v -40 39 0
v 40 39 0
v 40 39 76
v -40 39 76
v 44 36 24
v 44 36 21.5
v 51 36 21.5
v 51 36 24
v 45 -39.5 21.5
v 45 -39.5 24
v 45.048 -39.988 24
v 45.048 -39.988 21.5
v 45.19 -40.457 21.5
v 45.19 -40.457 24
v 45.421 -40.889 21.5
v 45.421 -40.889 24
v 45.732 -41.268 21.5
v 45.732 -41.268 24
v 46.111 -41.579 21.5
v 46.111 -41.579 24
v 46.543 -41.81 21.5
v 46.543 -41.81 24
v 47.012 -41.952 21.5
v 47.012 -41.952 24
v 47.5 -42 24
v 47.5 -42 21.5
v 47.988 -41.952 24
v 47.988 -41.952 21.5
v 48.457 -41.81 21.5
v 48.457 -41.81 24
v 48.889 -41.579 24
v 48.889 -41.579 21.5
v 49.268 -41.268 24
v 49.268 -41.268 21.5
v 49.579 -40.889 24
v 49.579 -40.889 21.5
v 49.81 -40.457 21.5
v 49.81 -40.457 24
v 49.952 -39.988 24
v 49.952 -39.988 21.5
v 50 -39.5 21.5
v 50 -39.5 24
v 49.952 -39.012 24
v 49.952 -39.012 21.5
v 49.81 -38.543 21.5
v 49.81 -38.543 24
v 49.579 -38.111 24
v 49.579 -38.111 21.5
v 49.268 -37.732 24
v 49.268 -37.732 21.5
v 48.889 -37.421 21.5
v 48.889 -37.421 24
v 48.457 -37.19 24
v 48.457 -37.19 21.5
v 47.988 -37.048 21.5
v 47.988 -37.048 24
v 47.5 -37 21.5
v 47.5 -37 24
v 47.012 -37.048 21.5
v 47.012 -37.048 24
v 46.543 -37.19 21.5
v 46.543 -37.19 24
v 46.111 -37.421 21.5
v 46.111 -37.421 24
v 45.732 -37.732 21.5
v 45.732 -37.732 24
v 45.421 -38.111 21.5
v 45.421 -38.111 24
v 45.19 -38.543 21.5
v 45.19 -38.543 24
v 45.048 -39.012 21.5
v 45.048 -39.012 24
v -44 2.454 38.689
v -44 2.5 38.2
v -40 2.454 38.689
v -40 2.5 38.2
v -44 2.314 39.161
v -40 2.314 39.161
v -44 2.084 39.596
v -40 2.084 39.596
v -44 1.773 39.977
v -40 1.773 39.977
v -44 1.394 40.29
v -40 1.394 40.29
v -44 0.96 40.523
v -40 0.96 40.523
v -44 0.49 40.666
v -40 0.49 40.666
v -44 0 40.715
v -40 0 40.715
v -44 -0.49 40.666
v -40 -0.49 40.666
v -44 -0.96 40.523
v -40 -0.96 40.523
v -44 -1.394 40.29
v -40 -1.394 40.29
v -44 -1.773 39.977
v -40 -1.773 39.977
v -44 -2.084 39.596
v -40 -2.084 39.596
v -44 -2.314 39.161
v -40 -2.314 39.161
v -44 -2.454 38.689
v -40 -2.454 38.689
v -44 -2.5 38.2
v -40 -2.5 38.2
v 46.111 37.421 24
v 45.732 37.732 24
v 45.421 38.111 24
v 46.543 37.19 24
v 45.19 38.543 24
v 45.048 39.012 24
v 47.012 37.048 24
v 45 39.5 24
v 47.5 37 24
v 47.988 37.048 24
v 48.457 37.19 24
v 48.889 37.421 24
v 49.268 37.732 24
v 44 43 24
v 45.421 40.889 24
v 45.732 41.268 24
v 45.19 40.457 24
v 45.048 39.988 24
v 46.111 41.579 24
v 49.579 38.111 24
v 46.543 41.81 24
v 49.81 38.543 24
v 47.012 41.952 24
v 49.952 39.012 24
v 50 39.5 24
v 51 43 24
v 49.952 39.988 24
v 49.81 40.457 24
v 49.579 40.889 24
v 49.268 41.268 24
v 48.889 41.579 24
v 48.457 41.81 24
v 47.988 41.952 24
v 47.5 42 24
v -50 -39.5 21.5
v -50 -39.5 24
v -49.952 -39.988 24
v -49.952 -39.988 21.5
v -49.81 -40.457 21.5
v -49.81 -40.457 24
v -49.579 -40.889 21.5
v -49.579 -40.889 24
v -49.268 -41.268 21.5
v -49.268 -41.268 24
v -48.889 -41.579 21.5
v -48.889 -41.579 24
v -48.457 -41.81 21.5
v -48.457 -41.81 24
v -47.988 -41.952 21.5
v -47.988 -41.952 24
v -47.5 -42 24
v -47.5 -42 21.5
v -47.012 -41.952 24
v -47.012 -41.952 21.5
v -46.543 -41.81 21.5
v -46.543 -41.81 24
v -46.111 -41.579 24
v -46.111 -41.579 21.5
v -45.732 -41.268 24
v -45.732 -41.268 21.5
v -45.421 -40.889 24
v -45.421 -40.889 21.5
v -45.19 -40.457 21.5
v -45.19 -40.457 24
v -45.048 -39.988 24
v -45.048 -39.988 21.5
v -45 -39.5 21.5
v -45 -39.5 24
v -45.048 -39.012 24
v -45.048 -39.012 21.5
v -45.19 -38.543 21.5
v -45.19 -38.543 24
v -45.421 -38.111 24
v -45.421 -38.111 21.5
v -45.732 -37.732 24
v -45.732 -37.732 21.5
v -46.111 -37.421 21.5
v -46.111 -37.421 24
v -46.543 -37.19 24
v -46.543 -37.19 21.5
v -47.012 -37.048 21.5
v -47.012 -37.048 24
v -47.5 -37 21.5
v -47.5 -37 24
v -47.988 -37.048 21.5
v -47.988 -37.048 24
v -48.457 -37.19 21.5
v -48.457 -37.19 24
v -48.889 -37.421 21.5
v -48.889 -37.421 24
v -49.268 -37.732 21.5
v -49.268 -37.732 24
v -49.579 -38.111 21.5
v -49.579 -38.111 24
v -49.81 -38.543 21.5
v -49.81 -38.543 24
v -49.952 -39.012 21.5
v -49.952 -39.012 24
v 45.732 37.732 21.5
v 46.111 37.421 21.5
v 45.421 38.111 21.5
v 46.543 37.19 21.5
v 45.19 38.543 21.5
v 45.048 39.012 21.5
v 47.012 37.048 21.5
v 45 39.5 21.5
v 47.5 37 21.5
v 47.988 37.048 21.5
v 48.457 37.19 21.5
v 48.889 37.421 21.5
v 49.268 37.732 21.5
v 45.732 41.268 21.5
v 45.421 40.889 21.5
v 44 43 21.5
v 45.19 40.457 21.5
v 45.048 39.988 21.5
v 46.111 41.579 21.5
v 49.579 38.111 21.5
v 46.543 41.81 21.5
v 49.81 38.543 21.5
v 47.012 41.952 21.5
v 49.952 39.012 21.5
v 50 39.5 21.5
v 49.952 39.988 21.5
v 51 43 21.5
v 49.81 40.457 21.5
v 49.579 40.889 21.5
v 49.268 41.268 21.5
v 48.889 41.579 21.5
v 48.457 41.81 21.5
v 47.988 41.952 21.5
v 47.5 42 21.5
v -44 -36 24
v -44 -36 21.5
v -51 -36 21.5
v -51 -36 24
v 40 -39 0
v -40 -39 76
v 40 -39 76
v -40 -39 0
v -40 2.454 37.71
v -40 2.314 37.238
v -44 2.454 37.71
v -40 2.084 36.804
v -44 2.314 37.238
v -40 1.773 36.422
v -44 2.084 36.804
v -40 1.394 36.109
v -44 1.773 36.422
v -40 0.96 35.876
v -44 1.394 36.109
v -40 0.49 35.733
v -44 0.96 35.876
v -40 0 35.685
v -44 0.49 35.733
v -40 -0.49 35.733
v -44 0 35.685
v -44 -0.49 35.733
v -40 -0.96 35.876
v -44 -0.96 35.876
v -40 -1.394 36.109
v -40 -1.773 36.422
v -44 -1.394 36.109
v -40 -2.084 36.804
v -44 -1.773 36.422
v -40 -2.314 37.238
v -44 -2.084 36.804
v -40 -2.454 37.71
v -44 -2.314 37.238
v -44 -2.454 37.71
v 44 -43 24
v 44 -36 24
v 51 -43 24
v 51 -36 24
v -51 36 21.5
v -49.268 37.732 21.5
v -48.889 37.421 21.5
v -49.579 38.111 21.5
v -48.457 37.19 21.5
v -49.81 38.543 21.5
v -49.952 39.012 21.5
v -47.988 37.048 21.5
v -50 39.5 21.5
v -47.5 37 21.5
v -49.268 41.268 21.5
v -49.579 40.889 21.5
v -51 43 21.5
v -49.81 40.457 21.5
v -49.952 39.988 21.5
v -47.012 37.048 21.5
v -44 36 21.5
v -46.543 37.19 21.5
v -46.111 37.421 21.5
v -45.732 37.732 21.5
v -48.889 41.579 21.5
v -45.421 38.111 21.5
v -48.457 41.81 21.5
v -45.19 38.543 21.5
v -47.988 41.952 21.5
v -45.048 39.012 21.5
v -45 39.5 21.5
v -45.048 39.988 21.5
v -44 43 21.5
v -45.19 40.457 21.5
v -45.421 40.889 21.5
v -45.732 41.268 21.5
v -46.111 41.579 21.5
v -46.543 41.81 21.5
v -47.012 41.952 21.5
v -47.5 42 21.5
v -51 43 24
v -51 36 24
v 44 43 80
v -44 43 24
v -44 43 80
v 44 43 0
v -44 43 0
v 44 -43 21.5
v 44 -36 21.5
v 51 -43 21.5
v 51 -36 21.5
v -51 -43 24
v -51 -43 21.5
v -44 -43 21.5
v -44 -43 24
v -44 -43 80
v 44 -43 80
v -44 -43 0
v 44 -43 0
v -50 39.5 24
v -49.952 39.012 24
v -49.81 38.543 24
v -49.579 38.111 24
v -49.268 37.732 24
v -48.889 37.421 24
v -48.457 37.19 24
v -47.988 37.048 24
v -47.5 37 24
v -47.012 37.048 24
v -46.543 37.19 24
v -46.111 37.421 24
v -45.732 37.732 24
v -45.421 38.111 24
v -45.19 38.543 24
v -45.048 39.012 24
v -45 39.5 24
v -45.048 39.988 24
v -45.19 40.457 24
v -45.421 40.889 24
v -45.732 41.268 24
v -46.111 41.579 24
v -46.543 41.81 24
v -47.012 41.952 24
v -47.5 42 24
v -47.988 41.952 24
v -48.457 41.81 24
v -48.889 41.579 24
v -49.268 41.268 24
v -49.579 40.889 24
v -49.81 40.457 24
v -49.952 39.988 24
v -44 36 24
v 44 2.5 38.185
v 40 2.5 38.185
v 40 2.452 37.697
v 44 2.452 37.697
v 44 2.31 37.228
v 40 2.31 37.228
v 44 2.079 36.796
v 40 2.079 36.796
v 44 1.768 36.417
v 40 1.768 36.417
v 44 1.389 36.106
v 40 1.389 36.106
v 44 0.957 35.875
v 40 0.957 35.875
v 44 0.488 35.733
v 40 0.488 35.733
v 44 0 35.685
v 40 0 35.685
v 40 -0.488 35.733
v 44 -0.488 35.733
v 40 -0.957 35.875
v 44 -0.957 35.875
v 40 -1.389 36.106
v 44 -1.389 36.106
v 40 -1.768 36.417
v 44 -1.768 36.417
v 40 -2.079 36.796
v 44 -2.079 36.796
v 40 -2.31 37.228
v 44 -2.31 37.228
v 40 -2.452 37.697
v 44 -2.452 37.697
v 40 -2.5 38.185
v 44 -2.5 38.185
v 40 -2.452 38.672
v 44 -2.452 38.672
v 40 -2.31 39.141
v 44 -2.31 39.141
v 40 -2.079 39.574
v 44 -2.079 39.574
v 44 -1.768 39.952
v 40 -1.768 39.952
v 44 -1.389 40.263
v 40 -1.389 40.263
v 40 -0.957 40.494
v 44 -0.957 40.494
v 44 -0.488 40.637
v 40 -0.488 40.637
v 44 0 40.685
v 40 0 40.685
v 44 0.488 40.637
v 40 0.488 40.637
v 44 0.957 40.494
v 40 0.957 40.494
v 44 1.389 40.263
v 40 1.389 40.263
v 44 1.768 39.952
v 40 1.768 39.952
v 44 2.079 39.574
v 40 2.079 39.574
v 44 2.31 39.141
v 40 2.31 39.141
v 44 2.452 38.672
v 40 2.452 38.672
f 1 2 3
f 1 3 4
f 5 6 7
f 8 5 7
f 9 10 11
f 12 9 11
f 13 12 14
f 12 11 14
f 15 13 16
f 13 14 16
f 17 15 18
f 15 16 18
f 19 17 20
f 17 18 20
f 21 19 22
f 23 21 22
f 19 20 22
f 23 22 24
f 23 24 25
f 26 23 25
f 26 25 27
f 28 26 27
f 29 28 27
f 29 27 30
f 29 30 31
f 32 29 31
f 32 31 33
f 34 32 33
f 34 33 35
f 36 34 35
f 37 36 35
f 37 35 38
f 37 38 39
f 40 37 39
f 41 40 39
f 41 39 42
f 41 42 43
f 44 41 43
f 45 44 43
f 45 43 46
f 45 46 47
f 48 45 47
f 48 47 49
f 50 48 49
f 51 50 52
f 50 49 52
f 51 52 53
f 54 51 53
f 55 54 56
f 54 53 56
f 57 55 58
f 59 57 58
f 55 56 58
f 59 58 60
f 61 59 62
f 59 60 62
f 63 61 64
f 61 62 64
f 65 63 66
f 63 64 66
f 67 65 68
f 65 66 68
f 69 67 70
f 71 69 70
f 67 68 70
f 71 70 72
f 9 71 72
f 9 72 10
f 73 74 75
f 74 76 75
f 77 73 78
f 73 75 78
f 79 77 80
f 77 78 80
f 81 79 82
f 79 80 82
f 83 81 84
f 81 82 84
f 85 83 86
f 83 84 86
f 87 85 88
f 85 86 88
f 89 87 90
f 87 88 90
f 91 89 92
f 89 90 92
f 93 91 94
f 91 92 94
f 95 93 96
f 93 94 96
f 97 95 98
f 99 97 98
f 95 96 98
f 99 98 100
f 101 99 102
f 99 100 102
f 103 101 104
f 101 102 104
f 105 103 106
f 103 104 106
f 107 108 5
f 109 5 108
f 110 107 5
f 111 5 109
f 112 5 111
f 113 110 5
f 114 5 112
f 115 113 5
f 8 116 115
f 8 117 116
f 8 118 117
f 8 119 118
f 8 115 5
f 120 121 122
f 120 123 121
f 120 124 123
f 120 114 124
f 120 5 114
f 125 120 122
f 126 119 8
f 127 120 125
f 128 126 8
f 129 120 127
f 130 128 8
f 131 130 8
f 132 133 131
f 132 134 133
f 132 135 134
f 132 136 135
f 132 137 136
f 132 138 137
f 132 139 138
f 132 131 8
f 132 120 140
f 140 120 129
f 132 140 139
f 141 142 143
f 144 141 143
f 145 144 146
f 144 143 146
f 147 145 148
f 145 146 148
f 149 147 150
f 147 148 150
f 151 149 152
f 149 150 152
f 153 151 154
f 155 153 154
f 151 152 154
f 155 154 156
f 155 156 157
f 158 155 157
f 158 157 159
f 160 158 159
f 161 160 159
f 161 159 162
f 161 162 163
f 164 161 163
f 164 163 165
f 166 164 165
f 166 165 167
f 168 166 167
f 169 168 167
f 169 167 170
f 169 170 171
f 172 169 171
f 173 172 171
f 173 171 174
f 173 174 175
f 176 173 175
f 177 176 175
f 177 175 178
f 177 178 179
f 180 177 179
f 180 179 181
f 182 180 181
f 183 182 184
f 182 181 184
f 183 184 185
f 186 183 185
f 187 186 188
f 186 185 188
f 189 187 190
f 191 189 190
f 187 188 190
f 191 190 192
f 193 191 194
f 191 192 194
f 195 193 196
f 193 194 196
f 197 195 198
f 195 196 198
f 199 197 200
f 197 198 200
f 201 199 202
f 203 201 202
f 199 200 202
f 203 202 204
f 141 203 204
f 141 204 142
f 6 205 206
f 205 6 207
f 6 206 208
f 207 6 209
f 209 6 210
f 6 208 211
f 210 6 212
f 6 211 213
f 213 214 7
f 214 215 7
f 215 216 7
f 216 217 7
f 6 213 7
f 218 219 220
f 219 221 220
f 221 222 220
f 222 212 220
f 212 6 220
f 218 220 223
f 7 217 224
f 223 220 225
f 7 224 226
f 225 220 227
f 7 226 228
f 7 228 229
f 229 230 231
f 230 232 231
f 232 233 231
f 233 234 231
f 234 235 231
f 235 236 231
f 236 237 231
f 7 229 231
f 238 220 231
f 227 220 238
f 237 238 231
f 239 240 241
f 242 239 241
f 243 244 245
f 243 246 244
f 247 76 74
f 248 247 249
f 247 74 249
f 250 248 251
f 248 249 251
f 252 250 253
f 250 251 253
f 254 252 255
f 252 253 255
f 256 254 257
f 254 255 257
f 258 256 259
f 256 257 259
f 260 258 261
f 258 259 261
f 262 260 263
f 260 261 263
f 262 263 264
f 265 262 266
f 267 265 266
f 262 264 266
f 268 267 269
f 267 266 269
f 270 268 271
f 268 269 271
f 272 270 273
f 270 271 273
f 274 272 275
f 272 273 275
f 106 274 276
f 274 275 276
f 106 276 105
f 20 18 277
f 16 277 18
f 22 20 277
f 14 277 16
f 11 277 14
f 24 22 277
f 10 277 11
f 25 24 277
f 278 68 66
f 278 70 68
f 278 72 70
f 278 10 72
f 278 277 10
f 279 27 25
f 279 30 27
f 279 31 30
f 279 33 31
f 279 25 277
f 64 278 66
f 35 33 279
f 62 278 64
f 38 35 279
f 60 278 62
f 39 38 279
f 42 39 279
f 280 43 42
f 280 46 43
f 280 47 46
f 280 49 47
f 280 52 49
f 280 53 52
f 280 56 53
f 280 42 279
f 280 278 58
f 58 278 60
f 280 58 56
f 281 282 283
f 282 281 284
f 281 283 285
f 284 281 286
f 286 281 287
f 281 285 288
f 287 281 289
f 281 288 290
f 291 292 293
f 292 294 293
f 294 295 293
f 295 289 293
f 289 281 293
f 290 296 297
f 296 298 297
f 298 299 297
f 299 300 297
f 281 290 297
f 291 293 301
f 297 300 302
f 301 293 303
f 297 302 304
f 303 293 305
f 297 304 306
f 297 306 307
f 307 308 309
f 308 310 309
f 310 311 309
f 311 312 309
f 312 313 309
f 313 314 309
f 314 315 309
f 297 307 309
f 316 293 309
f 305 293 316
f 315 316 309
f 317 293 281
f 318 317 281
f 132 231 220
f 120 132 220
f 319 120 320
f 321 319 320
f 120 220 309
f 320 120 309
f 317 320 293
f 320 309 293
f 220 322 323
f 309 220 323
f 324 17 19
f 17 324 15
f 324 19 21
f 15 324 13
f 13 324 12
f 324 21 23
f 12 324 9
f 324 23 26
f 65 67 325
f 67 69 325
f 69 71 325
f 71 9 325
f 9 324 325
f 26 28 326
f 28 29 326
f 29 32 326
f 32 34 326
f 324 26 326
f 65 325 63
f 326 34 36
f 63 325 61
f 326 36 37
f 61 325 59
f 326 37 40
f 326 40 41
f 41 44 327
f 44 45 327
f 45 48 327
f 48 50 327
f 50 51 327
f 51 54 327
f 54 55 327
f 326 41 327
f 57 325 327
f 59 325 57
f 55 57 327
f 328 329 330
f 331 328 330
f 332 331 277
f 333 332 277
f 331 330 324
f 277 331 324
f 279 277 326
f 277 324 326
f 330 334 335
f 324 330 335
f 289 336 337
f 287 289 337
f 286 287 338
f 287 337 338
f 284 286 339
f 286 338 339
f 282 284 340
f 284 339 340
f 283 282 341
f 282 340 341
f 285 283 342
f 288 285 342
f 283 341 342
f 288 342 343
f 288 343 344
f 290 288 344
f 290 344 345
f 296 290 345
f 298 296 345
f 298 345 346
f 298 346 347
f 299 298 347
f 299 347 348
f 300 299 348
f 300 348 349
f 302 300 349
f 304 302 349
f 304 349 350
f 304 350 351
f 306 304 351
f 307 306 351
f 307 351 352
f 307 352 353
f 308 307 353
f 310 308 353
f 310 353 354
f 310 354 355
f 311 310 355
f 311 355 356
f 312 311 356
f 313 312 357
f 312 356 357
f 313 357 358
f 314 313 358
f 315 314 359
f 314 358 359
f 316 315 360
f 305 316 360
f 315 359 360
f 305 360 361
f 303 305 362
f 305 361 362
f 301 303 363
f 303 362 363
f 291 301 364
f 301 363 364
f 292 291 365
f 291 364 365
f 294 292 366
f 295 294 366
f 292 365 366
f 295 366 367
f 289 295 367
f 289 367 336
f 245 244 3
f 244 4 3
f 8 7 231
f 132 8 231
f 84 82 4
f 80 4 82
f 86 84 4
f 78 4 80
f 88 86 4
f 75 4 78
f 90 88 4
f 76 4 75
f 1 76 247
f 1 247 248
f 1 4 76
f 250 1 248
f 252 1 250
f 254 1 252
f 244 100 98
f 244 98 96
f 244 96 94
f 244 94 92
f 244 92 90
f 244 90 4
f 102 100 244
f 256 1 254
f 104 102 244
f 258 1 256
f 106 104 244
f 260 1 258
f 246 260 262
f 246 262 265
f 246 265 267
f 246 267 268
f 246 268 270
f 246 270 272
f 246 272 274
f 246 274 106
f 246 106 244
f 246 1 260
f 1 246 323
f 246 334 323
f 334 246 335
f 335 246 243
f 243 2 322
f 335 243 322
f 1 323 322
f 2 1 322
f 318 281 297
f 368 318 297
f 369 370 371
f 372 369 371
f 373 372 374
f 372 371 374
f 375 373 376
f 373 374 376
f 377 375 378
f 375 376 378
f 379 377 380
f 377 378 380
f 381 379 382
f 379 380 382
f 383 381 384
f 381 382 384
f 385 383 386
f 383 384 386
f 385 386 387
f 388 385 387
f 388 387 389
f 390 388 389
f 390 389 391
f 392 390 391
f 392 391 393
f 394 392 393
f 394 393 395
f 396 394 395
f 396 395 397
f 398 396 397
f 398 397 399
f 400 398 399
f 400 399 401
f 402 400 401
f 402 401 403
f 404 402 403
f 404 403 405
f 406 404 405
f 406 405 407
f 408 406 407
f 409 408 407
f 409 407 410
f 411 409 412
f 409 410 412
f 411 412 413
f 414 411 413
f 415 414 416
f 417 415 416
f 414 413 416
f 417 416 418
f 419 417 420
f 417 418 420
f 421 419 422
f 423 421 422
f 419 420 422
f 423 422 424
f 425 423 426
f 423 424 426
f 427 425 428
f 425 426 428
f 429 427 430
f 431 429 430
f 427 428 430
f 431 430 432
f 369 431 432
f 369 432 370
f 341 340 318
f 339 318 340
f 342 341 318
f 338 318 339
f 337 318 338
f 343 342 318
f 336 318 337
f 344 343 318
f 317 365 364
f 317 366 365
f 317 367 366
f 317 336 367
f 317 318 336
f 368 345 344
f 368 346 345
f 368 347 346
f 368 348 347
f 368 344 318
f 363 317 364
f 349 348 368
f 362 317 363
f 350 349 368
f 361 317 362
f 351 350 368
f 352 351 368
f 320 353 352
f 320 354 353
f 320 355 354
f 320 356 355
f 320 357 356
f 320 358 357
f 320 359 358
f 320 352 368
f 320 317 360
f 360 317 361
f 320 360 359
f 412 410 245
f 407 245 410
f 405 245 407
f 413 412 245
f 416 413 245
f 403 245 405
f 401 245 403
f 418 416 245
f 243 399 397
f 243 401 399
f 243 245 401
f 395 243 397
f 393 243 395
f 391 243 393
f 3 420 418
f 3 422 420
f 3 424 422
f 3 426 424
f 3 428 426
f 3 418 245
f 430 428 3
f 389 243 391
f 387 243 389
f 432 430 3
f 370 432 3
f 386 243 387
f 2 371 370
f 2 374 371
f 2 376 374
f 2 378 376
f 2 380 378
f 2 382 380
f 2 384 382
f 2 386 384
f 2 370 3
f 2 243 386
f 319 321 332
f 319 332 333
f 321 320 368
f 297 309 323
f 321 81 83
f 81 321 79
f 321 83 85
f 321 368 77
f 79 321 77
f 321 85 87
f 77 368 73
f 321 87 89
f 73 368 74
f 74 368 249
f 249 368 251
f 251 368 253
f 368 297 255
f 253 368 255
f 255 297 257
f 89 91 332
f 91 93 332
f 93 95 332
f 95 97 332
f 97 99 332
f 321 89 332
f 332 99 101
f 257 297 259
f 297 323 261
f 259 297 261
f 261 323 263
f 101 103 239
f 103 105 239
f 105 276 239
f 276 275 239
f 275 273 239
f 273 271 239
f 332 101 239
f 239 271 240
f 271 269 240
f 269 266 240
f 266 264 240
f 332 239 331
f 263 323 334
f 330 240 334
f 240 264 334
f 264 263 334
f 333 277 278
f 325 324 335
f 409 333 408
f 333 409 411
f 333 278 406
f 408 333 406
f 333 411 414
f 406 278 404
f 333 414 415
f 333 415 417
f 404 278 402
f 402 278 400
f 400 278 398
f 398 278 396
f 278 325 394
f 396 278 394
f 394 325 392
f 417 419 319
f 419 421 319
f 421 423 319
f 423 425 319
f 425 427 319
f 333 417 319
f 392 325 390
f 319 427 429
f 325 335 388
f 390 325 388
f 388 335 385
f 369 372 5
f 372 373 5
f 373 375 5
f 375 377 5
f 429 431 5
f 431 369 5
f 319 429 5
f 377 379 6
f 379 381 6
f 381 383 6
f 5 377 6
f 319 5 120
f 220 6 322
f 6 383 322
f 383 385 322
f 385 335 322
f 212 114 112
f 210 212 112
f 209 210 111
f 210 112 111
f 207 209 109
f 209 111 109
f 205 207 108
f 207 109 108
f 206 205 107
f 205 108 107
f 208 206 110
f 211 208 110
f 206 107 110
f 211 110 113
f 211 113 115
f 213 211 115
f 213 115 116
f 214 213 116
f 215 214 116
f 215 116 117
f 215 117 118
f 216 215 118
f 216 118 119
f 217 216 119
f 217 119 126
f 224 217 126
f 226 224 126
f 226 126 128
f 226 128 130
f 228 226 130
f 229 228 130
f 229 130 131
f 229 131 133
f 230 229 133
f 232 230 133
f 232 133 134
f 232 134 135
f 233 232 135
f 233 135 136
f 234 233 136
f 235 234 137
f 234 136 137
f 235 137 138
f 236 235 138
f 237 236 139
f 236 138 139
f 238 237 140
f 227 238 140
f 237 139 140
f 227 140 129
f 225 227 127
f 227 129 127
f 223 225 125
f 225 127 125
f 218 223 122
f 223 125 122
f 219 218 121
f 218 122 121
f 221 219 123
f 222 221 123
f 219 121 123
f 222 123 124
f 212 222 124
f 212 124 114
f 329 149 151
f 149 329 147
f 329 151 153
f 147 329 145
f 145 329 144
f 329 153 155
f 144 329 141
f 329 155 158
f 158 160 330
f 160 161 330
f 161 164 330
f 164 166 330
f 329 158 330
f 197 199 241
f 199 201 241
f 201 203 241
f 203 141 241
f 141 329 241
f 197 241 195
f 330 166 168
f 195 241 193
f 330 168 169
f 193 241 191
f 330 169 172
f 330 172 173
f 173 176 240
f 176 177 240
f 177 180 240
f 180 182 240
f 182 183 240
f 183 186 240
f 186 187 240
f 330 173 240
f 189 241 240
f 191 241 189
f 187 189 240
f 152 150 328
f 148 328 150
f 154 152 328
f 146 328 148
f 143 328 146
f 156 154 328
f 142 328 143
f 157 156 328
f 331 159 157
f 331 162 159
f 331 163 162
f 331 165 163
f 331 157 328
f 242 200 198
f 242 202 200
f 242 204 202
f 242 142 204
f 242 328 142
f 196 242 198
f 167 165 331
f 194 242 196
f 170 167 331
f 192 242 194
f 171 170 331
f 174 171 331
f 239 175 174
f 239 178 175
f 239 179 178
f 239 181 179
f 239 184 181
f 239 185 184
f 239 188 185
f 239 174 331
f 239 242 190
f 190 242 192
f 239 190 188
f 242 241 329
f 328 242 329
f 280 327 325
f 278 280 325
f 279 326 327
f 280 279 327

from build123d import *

# Parameters (mm, degrees)
F1_DEPTH  = 80
F8_DEPTH  = 2.5
F9_T      = -4
F10_D     = 5
F14_D     = 5
F15_D     = 5
F15_DEPTH = 51.001


with BuildPart() as f1:
    # F0 (on Top) → F1 (new body)
    with BuildSketch(Plane.XY):
        Polygon((44, -43), (44, 43), (37, 43), (-37, 43), (-44, 43), (-44, -43), (-37, -43), (37, -43), align=None)
    extrude(amount=F1_DEPTH)

    # F7 (on 3pt) → F8 (join)
    with BuildSketch(Plane.XY.offset(21.5)):
        Polygon((-47.5, 39.5), (-51, 43), (-51, 36), align=None)
        Polygon((-51, 36), (-44, 36), (-47.5, 39.5), align=None)
        Polygon((-44, 36), (-44, 43), (-47.5, 39.5), align=None)
        Polygon((-47.5, 39.5), (-44, 43), (-51, 43), align=None)
        Polygon((51, 43), (44, 43), (47.5, 39.5), align=None)
        Polygon((47.5, 39.5), (44, 36), (51, 36), align=None)
        Polygon((51, 36), (51, 43), (47.5, 39.5), align=None)
        Polygon((47.5, 39.5), (44, 43), (44, 36), align=None)
        Polygon((47.5, -39.5), (44, -43), (51, -43), align=None)
        Polygon((51, -36), (44, -36), (47.5, -39.5), align=None)
        Polygon((51, -43), (51, -36), (47.5, -39.5), align=None)
        Polygon((47.5, -39.5), (44, -36), (44, -43), align=None)
        Polygon((-44, -43), (-44, -36), (-47.5, -39.5), align=None)
        Polygon((-47.5, -39.5), (-44, -36), (-51, -36), align=None)
        Polygon((-51, -43), (-47.5, -39.5), (-51, -36), align=None)
        Polygon((-51, -43), (-44, -43), (-47.5, -39.5), align=None)
    extrude(amount=F8_DEPTH)

    # F9
    f9_openings = [f1.faces().sort_by_distance(p)[0] for p in [
        (0, 0, 0),
    ]]
    offset(amount=F9_T, openings=f9_openings, kind=Kind.INTERSECTION)

    # F10 (through all)
    with Locations(Plane(origin=(0, 0, 21.5), x_dir=(1, 0, 0), z_dir=(0, 0, -1))):
        with Locations((47.5, 39.5), (47.5, -39.5), (-47.5, -39.5), (-47.5, 39.5)):
            Hole(F10_D / 2)

    # F14 (through all)
    with Locations(Plane(origin=(44, 0, 0), x_dir=(0, -1, 0), z_dir=(1, 0, 0))):
        with Locations((0, -38.1846800447)):
            Hole(F14_D / 2)

    # F15 (through all, one way)
    with BuildSketch(Plane.YZ):
        with Locations((0, 38.2145792246)):
            Circle(F15_D / 2)
    extrude(amount=-F15_DEPTH, mode=Mode.SUBTRACT)


solid = f1.part
